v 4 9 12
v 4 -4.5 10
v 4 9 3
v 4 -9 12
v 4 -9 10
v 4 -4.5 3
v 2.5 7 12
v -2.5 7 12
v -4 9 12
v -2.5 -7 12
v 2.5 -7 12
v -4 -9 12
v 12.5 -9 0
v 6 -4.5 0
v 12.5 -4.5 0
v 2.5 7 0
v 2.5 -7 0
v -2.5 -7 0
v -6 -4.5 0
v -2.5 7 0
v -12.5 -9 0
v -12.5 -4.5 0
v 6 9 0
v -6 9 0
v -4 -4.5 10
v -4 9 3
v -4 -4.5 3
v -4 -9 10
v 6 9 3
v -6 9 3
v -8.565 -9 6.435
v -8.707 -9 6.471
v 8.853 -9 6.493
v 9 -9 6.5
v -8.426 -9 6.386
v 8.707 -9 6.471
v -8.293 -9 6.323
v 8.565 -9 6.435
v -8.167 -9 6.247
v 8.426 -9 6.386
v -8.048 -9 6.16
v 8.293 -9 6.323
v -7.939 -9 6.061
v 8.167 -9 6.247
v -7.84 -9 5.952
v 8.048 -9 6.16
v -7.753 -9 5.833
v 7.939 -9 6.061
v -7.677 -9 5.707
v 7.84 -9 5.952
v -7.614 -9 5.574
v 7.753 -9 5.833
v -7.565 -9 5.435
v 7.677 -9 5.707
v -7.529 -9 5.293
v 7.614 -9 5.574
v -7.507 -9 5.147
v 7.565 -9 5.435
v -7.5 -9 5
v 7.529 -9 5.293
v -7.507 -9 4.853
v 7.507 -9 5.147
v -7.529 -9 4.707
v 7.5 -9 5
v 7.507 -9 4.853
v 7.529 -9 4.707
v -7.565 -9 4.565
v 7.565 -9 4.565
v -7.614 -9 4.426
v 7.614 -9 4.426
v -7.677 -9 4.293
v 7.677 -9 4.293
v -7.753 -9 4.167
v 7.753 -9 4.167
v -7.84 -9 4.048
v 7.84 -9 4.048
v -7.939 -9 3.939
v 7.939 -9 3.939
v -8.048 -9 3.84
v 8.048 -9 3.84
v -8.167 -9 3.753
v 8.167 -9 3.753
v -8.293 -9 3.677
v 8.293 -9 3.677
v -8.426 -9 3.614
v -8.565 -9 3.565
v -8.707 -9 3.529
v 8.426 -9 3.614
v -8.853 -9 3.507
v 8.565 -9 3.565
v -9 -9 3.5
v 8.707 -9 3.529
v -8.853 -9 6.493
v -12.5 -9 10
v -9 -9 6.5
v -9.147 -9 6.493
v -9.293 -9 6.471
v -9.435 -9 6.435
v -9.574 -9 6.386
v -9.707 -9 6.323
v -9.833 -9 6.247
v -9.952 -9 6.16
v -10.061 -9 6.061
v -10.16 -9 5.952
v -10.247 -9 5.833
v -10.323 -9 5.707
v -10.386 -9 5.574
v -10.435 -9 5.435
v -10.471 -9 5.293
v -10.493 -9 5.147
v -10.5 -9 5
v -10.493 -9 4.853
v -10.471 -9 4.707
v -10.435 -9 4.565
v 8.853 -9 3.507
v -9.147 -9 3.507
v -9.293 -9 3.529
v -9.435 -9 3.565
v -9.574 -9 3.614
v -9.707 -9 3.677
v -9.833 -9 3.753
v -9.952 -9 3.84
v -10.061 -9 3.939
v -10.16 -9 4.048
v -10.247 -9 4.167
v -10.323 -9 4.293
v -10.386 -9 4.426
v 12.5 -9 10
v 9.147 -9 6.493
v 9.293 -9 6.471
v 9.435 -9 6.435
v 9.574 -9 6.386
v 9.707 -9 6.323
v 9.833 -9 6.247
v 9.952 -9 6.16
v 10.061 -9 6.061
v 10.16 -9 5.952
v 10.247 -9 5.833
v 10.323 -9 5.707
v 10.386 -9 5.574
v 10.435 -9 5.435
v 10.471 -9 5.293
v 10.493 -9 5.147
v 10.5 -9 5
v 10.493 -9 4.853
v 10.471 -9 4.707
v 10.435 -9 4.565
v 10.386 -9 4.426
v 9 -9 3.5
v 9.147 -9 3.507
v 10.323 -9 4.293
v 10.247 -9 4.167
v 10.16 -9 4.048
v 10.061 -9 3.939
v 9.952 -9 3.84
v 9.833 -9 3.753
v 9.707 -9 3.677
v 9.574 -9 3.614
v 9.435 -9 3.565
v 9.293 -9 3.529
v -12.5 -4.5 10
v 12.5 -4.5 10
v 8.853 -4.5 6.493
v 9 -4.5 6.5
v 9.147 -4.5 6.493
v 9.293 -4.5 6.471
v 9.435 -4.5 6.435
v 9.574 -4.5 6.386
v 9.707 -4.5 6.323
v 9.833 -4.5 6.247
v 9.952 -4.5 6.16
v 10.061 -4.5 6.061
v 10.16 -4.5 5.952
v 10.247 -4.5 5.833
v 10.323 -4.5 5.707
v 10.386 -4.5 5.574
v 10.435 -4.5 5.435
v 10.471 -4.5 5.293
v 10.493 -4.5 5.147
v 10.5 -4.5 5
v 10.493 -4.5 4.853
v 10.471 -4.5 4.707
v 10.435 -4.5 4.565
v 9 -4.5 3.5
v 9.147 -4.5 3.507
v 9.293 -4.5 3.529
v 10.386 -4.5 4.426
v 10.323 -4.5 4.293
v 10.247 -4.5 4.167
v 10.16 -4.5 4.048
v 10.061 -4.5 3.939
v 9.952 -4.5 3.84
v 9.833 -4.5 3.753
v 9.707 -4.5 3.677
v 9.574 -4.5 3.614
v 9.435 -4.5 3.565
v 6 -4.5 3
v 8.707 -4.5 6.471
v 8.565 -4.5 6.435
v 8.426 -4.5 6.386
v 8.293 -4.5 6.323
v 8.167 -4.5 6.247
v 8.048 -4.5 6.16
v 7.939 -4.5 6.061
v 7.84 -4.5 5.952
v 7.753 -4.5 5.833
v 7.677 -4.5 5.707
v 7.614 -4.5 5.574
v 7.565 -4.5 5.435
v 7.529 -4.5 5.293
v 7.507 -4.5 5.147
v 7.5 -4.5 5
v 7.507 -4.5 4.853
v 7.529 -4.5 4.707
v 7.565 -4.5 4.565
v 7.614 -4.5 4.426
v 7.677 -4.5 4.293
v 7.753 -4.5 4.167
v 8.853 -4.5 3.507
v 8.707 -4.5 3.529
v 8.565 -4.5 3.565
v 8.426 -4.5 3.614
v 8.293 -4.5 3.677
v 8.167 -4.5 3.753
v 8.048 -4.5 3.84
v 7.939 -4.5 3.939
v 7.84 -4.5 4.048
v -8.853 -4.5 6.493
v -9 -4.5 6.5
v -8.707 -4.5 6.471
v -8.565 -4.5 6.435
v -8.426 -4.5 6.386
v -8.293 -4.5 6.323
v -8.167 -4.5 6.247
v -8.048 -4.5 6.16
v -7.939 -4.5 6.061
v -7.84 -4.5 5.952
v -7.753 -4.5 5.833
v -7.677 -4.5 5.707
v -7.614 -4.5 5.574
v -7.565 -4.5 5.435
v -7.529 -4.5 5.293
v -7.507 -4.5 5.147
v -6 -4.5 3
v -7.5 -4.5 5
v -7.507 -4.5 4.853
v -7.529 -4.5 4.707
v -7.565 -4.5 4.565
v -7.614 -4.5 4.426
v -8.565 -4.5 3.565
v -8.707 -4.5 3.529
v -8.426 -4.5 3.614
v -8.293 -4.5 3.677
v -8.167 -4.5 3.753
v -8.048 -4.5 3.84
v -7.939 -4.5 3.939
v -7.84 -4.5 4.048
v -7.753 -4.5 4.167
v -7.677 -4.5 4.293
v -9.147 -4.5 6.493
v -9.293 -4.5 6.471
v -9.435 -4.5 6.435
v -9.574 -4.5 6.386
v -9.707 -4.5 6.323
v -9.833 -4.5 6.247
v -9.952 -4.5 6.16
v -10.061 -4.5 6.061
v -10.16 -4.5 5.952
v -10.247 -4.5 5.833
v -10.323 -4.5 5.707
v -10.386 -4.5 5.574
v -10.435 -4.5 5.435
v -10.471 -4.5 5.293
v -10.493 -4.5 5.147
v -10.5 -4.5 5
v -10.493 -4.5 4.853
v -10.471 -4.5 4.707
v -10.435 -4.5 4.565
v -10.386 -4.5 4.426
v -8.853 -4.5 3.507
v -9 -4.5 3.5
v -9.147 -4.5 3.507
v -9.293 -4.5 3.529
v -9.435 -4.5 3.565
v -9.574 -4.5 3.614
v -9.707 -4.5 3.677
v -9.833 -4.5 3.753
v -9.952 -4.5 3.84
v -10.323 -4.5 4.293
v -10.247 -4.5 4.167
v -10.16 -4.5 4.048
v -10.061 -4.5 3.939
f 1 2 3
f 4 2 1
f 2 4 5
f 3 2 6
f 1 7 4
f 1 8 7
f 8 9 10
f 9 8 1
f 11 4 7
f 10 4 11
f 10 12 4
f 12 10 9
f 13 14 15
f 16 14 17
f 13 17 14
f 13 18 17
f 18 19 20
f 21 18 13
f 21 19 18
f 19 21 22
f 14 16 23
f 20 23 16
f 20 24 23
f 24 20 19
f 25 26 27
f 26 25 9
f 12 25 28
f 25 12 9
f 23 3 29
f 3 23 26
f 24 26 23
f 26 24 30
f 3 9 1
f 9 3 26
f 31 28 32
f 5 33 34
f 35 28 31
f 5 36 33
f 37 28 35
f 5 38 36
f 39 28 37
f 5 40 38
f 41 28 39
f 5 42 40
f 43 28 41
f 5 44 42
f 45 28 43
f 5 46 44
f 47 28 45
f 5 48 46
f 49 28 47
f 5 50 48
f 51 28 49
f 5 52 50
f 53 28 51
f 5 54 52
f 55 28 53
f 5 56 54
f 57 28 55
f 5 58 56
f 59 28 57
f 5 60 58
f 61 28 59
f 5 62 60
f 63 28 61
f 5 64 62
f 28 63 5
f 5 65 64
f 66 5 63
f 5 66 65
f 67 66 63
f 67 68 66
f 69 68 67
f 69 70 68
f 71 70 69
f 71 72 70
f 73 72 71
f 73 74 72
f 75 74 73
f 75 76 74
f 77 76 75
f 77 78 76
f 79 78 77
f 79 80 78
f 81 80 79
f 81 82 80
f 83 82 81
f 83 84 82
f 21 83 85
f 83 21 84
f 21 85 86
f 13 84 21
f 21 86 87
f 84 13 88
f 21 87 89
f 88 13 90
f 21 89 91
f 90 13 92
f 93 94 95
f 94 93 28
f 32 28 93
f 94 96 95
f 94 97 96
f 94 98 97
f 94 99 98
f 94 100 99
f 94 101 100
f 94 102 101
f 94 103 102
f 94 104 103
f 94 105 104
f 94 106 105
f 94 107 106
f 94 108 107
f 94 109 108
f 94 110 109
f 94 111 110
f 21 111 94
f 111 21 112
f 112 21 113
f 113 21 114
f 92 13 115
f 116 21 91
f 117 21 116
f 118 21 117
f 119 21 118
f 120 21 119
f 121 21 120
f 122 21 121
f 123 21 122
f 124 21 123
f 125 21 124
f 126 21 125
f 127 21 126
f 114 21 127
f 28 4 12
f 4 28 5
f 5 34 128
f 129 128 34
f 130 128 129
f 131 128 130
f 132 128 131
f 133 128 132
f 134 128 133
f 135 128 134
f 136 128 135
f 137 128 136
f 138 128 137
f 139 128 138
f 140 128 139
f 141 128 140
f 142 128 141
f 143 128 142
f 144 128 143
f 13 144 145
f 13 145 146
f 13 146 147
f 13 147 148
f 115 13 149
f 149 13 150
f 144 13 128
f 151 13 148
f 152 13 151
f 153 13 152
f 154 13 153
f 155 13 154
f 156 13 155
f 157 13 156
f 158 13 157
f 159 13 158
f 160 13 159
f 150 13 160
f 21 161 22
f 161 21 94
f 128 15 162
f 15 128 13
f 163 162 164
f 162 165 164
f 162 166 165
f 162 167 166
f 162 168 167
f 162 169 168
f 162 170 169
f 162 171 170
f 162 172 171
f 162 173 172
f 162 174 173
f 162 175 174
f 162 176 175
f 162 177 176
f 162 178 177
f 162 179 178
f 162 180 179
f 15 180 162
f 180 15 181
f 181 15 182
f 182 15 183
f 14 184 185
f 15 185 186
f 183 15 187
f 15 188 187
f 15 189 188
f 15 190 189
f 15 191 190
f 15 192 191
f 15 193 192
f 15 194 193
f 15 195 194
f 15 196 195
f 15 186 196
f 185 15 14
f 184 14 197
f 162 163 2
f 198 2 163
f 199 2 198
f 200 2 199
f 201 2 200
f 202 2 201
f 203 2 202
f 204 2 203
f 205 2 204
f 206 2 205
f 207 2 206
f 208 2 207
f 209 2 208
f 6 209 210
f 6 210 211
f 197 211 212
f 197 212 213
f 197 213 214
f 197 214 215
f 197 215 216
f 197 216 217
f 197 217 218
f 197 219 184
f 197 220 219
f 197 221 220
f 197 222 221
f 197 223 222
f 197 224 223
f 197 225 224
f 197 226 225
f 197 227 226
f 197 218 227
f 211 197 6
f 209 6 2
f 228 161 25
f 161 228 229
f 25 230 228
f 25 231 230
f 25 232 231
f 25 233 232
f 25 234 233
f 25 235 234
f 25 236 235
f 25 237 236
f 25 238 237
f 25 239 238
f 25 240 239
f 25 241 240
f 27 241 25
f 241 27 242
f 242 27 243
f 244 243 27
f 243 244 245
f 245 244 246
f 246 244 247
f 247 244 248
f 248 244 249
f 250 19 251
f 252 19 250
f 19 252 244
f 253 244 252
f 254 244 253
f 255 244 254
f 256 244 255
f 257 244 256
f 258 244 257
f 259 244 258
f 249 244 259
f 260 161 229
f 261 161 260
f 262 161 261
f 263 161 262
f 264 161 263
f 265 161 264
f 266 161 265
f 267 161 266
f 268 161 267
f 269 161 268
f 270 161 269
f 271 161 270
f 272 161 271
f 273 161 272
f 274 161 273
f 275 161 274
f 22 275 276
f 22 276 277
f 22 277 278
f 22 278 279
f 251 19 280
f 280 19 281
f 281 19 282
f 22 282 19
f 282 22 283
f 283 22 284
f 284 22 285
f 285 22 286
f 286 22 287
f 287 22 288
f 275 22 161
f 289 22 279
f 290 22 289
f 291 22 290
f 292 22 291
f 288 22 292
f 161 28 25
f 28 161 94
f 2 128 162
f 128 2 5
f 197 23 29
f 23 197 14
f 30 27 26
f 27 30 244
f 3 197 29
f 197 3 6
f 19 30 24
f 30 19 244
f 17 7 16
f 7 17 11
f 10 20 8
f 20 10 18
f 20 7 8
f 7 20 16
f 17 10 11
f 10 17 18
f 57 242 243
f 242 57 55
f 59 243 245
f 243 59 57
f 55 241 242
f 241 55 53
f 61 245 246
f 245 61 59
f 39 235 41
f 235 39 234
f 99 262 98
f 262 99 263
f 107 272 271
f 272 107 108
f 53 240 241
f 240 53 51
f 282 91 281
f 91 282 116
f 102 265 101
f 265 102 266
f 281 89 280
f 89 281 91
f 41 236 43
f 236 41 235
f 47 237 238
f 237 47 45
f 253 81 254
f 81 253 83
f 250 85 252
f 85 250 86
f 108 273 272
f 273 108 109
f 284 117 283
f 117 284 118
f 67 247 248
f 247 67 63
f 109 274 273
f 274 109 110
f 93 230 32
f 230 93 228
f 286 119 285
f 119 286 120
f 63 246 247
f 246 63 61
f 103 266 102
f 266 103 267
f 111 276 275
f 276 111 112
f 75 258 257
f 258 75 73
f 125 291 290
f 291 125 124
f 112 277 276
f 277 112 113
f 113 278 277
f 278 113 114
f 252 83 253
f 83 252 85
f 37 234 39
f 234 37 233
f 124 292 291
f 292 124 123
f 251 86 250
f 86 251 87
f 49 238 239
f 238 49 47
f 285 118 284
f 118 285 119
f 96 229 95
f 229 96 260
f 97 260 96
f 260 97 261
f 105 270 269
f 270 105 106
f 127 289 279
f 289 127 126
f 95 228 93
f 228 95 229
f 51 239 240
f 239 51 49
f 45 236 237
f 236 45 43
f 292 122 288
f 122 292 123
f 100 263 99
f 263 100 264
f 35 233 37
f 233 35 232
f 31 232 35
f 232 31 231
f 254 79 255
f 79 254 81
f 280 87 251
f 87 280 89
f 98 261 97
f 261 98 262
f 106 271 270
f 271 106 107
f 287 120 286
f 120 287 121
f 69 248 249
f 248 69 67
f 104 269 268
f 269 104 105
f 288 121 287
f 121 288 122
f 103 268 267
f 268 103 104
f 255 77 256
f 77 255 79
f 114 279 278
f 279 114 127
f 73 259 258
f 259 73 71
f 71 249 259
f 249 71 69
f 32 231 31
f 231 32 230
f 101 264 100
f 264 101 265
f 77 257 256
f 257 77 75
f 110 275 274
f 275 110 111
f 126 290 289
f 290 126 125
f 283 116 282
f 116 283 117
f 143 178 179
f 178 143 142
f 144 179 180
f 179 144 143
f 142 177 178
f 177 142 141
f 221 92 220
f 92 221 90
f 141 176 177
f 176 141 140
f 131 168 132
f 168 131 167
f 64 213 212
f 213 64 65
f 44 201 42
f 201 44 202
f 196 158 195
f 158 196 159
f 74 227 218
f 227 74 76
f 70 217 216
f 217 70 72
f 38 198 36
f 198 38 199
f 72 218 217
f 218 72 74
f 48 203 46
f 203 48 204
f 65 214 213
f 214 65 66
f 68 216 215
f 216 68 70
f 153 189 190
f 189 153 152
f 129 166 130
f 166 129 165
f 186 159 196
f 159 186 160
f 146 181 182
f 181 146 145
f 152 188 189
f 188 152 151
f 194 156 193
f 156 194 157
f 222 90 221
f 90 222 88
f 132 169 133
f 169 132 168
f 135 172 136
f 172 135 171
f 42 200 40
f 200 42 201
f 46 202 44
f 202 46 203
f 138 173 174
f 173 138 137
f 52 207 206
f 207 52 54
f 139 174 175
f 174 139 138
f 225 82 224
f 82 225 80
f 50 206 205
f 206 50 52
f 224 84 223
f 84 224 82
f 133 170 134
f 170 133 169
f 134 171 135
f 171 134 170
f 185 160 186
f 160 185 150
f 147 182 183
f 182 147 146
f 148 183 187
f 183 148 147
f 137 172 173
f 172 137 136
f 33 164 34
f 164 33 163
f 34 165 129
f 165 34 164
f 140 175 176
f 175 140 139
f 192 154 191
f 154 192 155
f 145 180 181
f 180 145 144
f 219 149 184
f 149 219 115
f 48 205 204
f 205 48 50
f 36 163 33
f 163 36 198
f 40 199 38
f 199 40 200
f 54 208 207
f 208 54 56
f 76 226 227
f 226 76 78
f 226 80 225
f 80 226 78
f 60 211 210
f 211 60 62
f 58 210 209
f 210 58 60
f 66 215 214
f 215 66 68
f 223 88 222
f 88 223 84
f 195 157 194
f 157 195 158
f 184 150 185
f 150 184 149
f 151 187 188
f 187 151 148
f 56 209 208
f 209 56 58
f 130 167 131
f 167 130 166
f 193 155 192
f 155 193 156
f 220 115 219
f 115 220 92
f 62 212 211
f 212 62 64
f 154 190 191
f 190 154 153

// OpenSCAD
$fn=64;

difference(){
    union(){
        difference(){
            union(){
                translate([0, 0, 6]) cube([8, 18, 12], true);
                rotate([90, 0, 0]) translate([0, 5, 6.75]) cube([25, 10, 4.5], true);
                translate([0, 0, 1.5]) cube([12, 18, 3], true);
            }
            //translate([0, 0, 1]) cube([6, 60, 3], true);
            translate([0, 0, 6]) cube([5, 14, 20], true);
        }
        //translate([0, 0, 6]) rotate([0,90,0]) cube([2, 4.5, 8], true);
    }
    translate([-9, -5, 5]) rotate([90,0,0]) cylinder(10,1.5,1.5,true);
    translate([9, -5, 5]) rotate([90,0,0]) cylinder(10,1.5,1.5,true);
    //translate([9, 0, 2]) rotate([0,25,0]) cylinder(10,1.5,1.5,true);
    //translate([0, 0, 6]) rotate([0,90,0]) cylinder(12,2,2,true);
}
